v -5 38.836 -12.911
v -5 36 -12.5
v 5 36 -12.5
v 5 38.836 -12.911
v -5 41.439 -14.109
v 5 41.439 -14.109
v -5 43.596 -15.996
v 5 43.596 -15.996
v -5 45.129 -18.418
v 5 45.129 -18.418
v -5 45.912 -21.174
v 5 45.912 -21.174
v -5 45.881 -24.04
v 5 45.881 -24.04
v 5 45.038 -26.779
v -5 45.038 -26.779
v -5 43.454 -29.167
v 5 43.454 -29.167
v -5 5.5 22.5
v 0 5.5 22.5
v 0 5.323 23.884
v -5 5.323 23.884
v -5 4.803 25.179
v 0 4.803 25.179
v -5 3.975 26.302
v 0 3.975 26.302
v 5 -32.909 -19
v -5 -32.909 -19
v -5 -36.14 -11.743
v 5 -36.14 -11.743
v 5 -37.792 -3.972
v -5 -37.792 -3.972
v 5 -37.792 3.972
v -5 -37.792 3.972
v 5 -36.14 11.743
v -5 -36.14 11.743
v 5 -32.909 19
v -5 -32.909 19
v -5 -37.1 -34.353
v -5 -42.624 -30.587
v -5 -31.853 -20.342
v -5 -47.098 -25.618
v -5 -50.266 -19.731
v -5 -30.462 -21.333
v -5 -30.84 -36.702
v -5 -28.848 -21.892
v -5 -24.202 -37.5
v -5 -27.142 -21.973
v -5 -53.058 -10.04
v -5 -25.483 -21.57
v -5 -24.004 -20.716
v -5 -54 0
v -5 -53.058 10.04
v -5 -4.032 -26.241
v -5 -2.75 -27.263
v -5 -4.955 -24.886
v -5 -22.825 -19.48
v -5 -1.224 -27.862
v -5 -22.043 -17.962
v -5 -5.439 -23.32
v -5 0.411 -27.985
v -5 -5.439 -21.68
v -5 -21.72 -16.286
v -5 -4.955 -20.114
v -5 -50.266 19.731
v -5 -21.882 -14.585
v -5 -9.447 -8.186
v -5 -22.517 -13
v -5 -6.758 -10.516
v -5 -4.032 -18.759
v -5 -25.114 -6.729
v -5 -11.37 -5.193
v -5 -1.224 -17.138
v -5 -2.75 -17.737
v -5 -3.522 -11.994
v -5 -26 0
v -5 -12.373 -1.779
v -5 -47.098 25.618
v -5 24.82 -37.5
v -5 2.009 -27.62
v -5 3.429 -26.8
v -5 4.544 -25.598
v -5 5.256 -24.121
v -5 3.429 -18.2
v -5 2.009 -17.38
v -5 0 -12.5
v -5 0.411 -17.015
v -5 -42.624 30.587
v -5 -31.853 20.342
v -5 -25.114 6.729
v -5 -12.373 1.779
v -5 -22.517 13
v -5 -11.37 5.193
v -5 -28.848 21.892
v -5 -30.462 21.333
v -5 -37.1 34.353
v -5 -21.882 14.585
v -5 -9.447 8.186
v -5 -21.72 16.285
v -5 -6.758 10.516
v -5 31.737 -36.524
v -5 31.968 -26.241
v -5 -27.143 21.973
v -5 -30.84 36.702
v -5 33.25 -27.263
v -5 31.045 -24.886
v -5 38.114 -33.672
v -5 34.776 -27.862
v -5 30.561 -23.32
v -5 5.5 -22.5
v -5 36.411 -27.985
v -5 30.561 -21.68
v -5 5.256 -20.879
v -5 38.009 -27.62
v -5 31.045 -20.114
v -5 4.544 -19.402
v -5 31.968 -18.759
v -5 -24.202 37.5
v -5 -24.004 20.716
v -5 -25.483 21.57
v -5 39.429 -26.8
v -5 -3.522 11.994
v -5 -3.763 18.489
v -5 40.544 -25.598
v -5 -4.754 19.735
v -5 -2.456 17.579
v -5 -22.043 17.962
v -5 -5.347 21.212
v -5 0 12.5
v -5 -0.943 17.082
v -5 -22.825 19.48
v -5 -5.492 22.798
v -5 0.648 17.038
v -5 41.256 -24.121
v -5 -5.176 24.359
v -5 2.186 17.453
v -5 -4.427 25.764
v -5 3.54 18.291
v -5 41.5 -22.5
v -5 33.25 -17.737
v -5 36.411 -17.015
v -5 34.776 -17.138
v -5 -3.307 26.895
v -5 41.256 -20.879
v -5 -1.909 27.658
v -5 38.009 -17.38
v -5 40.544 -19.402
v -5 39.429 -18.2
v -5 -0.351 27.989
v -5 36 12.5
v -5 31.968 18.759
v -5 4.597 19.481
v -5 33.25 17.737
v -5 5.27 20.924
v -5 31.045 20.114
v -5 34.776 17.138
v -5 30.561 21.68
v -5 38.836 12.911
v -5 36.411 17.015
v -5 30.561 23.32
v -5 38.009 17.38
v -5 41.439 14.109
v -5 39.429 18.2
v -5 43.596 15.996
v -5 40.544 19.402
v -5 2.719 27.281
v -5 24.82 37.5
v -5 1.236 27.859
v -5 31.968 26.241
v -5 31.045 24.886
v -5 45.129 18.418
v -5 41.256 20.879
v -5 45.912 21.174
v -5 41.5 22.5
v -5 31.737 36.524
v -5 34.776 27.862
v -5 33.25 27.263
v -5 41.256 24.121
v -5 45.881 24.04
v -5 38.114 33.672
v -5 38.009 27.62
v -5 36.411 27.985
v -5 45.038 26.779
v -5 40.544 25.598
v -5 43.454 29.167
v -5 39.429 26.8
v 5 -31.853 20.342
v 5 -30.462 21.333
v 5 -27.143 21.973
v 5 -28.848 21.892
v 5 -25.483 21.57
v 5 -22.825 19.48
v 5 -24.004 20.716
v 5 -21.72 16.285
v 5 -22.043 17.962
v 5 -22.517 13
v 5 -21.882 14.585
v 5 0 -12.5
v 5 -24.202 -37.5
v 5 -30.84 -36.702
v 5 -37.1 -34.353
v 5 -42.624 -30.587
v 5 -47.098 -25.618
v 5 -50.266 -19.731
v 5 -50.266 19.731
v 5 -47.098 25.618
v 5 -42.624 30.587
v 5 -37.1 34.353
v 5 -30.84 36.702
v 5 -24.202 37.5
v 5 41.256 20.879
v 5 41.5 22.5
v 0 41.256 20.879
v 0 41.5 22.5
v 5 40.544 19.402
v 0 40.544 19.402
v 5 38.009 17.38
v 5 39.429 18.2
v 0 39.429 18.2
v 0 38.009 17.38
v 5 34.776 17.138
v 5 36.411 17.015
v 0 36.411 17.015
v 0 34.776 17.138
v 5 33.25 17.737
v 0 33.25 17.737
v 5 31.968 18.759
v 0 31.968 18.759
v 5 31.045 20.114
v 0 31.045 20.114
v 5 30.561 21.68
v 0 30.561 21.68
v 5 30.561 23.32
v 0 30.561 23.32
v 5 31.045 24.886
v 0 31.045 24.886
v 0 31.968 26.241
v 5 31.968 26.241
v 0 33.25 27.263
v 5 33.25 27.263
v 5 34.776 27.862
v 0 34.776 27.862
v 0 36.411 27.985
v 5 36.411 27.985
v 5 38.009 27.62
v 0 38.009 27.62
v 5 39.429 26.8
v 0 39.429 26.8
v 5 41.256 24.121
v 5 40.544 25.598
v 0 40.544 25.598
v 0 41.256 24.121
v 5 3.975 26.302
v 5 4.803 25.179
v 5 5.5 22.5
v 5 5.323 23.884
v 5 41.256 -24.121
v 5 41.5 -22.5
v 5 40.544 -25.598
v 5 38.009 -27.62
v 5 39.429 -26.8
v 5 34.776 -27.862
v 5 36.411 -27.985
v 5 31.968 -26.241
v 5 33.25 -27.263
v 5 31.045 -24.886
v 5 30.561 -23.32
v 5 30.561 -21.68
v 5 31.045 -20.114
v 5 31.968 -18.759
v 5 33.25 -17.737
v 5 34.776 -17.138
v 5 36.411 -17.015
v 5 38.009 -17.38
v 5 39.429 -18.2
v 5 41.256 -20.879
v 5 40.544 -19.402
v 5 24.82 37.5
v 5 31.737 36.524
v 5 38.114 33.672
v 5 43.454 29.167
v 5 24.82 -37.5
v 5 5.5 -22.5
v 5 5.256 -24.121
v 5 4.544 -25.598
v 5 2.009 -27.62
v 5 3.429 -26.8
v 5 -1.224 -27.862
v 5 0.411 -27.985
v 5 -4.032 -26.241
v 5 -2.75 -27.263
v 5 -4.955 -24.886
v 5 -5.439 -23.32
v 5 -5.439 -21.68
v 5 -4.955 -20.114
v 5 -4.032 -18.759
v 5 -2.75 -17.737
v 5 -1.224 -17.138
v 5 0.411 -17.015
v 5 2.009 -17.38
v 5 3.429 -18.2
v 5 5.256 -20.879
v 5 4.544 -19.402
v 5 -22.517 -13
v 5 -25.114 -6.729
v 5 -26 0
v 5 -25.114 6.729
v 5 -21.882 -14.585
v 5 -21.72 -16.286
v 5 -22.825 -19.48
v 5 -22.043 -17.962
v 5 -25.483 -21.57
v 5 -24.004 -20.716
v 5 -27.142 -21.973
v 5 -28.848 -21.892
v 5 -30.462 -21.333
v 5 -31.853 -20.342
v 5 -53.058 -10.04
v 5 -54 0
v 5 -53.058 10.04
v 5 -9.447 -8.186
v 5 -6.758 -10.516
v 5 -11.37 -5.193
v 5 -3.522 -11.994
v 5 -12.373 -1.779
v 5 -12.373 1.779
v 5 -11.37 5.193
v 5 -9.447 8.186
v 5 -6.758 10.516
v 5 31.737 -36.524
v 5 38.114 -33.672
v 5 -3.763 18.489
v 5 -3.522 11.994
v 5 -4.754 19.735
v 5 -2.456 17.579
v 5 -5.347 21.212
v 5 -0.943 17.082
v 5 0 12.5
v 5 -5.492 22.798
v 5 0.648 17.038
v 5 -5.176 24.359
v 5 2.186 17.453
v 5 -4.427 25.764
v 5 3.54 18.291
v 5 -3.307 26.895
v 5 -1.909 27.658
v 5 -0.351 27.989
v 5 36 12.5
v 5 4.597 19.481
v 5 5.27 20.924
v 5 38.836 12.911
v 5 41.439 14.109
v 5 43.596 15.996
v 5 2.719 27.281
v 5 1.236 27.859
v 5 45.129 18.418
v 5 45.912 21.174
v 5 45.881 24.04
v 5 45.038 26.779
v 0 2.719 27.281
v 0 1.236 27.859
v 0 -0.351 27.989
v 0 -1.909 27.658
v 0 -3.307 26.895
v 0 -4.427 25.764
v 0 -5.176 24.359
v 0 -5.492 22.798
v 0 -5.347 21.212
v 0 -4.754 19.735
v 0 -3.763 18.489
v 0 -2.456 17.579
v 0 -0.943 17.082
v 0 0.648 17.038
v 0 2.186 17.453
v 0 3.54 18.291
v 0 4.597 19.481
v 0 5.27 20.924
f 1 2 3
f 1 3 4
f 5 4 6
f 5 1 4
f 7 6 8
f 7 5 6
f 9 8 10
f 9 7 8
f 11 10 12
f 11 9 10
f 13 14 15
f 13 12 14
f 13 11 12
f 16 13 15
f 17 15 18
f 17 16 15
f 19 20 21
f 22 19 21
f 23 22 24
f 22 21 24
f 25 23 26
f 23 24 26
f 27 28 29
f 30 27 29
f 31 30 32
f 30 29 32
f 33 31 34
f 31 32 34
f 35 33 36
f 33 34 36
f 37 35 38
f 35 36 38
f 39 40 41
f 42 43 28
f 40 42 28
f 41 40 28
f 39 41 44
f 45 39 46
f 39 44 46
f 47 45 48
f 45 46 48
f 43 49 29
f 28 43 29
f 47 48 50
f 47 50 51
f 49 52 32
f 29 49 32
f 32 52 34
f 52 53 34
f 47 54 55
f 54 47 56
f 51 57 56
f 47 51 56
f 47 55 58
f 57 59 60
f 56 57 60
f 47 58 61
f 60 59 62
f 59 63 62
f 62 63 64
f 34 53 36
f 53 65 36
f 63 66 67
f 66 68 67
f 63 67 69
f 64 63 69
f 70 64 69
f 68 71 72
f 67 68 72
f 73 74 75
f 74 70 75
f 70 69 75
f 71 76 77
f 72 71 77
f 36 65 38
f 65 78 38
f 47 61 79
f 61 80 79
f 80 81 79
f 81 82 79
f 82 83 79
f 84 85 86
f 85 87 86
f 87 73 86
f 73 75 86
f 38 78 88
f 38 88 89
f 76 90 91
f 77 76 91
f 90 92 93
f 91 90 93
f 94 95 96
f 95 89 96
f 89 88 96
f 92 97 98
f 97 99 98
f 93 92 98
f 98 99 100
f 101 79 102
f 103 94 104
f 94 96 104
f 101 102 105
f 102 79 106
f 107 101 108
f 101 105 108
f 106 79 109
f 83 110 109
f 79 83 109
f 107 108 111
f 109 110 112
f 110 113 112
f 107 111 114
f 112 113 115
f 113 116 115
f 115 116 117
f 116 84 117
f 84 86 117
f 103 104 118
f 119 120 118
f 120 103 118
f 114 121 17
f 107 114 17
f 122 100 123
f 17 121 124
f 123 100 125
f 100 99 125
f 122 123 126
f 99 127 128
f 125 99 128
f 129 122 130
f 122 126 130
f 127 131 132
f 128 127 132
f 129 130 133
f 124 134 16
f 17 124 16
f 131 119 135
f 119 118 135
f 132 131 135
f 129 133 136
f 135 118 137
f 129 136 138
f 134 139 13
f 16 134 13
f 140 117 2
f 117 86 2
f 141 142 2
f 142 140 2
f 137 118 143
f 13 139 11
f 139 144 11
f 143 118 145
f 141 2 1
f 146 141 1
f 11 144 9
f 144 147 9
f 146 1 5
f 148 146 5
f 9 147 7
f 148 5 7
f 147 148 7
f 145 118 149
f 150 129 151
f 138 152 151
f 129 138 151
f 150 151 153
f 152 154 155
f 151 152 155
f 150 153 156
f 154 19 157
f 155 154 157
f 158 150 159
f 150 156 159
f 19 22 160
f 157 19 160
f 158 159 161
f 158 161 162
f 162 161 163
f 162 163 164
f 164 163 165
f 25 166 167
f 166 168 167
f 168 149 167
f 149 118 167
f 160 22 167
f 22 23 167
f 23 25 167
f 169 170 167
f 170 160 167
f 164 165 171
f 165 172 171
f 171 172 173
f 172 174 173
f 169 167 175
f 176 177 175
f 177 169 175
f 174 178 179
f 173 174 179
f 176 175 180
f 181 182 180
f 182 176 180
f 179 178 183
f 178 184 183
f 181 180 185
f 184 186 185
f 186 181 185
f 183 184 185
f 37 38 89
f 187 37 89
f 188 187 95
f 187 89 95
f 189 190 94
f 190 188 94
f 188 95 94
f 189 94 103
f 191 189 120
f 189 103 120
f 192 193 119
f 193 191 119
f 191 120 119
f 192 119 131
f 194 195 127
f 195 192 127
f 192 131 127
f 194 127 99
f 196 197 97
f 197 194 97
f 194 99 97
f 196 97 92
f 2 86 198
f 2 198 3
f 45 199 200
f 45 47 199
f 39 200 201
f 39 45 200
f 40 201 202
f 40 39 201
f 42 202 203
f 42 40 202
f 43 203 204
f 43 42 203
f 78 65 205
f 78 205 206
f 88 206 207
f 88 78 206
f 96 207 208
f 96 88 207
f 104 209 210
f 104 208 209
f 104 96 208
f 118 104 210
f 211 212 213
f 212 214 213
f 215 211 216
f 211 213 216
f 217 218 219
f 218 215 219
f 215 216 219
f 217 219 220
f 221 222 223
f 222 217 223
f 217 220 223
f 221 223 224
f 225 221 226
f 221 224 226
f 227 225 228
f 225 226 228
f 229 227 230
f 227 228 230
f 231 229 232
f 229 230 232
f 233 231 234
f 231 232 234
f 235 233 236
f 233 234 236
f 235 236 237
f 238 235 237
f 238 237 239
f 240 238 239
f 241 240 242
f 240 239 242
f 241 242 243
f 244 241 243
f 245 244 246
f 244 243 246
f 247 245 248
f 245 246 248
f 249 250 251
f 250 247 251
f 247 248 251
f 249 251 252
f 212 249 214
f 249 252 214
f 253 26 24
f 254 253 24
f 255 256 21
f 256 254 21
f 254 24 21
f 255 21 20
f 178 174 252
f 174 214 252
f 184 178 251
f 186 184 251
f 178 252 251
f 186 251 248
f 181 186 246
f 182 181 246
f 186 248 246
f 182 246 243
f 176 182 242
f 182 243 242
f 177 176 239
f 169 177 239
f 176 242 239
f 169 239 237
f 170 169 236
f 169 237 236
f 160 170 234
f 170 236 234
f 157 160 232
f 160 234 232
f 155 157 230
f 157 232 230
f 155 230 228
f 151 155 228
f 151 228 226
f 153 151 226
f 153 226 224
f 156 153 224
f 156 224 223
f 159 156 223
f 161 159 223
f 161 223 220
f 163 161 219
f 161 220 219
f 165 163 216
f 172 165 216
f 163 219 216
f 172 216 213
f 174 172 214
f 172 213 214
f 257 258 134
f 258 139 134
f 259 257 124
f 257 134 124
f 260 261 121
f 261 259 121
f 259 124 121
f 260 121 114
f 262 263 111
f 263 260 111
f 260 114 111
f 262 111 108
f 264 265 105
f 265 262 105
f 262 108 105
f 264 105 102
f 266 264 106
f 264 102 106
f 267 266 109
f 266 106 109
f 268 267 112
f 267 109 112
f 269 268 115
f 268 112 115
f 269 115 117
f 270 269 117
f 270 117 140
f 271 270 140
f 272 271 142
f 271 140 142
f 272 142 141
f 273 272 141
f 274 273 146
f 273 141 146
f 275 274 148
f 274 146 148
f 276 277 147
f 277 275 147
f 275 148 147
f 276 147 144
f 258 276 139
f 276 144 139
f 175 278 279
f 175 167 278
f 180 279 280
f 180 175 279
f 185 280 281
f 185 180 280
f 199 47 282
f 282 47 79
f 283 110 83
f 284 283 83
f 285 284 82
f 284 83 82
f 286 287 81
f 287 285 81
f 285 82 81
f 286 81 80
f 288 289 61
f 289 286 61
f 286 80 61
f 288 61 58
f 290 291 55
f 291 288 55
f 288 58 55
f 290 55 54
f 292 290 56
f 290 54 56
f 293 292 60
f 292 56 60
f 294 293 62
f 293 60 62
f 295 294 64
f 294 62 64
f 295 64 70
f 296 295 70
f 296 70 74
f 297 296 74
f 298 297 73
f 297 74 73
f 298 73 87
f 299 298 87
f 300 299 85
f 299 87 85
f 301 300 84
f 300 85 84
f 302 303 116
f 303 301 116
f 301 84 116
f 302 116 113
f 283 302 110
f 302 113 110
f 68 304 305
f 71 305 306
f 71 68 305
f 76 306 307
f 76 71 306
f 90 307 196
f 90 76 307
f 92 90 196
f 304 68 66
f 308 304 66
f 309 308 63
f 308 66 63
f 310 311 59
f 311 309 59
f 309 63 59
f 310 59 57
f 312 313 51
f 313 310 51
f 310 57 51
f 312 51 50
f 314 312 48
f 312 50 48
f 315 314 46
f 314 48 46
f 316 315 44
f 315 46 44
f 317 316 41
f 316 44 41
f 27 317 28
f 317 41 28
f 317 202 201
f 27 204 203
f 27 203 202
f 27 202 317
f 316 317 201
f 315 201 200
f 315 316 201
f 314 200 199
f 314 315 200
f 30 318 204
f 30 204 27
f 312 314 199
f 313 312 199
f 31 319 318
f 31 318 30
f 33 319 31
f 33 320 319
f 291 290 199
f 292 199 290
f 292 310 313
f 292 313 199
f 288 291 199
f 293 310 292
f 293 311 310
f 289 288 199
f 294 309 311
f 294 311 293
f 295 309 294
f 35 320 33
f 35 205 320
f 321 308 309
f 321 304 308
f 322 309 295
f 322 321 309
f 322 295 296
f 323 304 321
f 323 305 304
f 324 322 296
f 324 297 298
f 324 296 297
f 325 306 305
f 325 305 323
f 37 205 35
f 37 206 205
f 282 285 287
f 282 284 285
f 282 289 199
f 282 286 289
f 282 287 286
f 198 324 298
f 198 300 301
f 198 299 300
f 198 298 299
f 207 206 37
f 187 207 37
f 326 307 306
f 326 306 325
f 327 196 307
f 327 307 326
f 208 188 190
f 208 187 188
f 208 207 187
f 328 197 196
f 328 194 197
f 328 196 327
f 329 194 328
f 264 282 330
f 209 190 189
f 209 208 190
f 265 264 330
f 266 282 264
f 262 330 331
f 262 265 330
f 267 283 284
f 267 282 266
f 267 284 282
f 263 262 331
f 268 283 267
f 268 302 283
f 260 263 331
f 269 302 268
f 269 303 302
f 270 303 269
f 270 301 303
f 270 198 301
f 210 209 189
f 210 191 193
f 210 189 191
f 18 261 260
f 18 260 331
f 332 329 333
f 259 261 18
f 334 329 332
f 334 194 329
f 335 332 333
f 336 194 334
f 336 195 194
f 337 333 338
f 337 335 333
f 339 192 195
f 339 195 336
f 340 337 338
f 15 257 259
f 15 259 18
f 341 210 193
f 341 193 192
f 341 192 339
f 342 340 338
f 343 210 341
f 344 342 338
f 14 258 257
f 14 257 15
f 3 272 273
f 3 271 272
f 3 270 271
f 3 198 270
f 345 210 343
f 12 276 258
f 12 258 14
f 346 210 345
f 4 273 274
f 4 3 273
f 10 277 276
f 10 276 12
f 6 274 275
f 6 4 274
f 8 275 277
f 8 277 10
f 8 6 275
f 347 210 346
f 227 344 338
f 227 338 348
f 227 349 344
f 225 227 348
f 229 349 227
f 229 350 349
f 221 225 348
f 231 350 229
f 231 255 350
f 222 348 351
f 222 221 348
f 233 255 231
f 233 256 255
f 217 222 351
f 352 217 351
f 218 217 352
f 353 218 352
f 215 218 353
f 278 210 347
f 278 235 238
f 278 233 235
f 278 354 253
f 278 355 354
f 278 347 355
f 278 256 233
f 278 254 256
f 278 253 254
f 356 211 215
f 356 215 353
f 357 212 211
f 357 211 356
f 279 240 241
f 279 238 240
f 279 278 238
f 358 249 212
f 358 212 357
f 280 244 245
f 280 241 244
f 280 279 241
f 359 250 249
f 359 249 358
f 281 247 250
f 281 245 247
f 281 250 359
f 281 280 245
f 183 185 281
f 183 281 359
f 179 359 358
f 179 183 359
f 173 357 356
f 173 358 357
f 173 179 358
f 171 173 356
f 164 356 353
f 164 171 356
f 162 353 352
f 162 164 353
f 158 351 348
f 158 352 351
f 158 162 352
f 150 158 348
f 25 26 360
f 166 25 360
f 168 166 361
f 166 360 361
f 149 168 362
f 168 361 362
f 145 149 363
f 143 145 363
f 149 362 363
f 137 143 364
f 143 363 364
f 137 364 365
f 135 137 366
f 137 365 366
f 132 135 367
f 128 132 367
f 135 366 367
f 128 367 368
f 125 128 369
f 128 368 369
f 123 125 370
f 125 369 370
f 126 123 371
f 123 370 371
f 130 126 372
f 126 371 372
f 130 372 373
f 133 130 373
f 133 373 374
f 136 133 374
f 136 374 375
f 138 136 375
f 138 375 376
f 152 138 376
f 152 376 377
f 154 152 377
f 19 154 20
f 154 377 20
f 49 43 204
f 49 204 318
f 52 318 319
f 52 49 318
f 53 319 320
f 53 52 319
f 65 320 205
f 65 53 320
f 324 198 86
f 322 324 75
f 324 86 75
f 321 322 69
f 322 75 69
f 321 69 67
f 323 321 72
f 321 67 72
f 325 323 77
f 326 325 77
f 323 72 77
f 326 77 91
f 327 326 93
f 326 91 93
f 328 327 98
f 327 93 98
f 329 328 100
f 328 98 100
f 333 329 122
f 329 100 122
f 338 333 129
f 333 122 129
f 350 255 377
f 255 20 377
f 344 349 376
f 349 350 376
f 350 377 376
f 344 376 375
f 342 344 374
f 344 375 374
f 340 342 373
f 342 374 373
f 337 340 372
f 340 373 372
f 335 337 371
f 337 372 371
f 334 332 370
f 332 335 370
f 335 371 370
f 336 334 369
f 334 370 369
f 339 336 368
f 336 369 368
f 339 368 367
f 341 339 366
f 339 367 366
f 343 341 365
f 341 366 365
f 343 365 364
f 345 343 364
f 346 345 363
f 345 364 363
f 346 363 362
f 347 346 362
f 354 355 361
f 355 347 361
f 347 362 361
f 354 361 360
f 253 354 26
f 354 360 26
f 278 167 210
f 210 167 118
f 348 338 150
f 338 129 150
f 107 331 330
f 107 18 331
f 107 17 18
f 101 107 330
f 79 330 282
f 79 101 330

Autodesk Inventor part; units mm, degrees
ref_plane "YZ Plane" through (0, 0, 0) normal (1, 0, 0) x (0, 1, 0)
ref_plane "XZ Plane" through (0, 0, 0) normal (0, 1, 0) x (-1, 0, 0)
ref_plane "XY Plane" through (0, 0, 0) normal (0, 0, 1) x (1, 0, 0)
sketch "Sketch1" plane through (0, 0, 0) normal (1, 0, 0) x (0, 1, 0)
  arc A0 (-50.2663, 19.7308) -> (-50.2663, -19.7308) centre (0, 0) ccw
  line L0 (24.8197, 37.5) -> (-24.2023, 37.5)
  line L1 (-24.2023, -37.5) -> (24.8197, -37.5)
  arc A1 (0, 12.5) -> (0, -12.5) centre (0, 0) ccw
  circle A2 centre (0, -22.5) radius 5.5
  circle A3 centre (0, 22.5) radius 5.5
  arc A4 (-24.2023, 37.5) -> (-50.2663, 19.7308) centre (-24.2023, 9.5) ccw
  line L2 (-14, 0) -> (-38, 0)
  arc A5 (-50.2663, -19.7308) -> (-24.2023, -37.5) centre (-24.2023, -9.5) ccw
  arc A6 (-22.5167, 13) -> (-32.909, 19) centre (-27.7128, 16) ccw
  arc A7 (-32.909, -19) -> (-22.5167, -13) centre (-27.7128, -16) ccw
  arc A8 (-32.909, 19) -> (-32.909, -19) centre (0, 0) ccw
  arc A9 (36, 12.5) -> (43.4536, 29.1667) centre (36, 22.5) ccw
  arc A10 (43.4536, -29.1667) -> (36, -12.5) centre (36, -22.5) ccw
  line L3 (0, 12.5) -> (0, -12.5)
  arc A11 (3.9746, 26.3016) -> (3.6179, 25.7471) centre (24.8197, 12.5) ccw
  arc A12 (-0.1803, 12.4987) -> (0, 9.5026) centre (24.8197, 12.5) ccw
  arc A13 (24.8197, -37.5) -> (43.4536, -29.1667) centre (24.8197, -12.5) ccw
  arc A14 (0, -9.5026) -> (-0.1803, -12.4987) centre (24.8197, -12.5) ccw
  arc A15 (43.4536, 29.1667) -> (24.8197, 37.5) centre (24.8197, 12.5) ccw
  line L4 (0, 12.5) -> (36, 12.5)
  line L5 (0, -12.5) -> (36, -12.5)
  circle A16 centre (36, 22.5) radius 5.5
  circle A17 centre (36, -22.5) radius 5.5
  arc A18 (-22.5167, 13) -> (-22.5167, -13) centre (0, 0) ccw
  dimension "d21" = 11
  dimension "d12" = 20
  dimension "d19" = 25
  dimension "d22" = 11
  dimension "d23" = 11
  dimension "d24" = 36
  dimension "d25" = 32
  dimension "d26" = 6
extrude "Extrusion1" add sketch "Sketch1" along normal mid plane 10 contours A4 L0 A15 A9 L4 A1 L5 A10 A13 L1 A5 A0
properties part number "hw7"
